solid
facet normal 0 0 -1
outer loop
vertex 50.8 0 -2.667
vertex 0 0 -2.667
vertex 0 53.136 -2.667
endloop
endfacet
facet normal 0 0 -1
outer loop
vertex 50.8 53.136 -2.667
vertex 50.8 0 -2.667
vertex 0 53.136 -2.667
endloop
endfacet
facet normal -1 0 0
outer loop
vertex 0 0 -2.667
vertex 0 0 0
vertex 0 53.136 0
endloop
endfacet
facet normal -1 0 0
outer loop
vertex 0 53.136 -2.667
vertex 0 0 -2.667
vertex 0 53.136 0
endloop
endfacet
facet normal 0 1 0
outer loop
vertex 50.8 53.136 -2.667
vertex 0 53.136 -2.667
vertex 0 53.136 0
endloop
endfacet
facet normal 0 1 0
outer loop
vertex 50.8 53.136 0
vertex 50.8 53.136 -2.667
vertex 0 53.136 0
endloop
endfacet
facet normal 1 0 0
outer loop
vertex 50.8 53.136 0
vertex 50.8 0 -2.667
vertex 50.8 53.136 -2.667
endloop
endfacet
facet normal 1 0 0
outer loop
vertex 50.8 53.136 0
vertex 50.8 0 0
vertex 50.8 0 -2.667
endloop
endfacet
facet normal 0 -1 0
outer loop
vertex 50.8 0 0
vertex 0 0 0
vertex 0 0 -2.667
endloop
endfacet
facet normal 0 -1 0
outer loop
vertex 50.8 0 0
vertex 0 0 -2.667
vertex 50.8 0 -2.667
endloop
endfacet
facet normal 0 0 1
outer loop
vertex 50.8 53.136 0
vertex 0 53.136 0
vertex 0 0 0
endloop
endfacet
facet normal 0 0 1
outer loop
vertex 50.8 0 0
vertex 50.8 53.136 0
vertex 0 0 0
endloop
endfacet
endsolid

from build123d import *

# Parameters (mm, degrees)
SKETCH1_W                    = 50.8
SKETCH1_H                    = 25.4
BASE_FLANGE1_DEPTH           = 2.667
EDGE_FLANGE1_STRIP_W         = 12.1412
EDGE_FLANGE1_STRIP_H         = 2.667
EDGE_FLANGE1_STRIP_CUT_DEPTH = 50.8
EDGE_FLANGE1_DEPTH           = 50.8
UNFOLD1_DEPTH                = 50.8
UNFOLD1_2_DEPTH              = 50.8


# Read off the part's stored shape, not the designer's step: Unfold1
# Sheet-metal steps are written as plain solids
with BuildPart() as part:
    # Sketch1 → Base-Flange1 (new body)
    with BuildSketch(Plane.XY):
        with Locations((25.4, 12.7)):
            Rectangle(SKETCH1_W, SKETCH1_H)
    extrude(amount=-BASE_FLANGE1_DEPTH)

    # Edge-Flange1 strip (across the edge) → Edge-Flange1 strip cut (cut)
    with BuildSketch(Plane(origin=(50.8, 25.4, 0), x_dir=(0, -1, 0), z_dir=(-1, 0, 0))):
        with Locations((-2.667, -1.3335)):
            Rectangle(EDGE_FLANGE1_STRIP_W, EDGE_FLANGE1_STRIP_H)
    extrude(amount=EDGE_FLANGE1_STRIP_CUT_DEPTH, mode=Mode.SUBTRACT)

    # Edge-Flange1 section (across the edge) → Edge-Flange1 (add)
    with BuildSketch(Plane(origin=(50.8, 25.4, 0), x_dir=(0, -1, 0), z_dir=(-1, 0, 0))):
        with BuildLine():
            Line((0, 0.7366), (0, 29.337))
            Line((0, 29.337), (2.667, 29.337))
            Line((2.667, 29.337), (2.667, 0.7366))
            ThreePointArc((2.667, 0.7366), (2.882745145, 0.215745145), (3.4036, 0))
            Line((3.4036, 0), (3.4036, -2.667))
            ThreePointArc((3.4036, -2.667), (0.99689136, -1.67010864), (0, 0.7366))
        make_face()
    extrude(amount=EDGE_FLANGE1_DEPTH)

    # Unfold1 outline → Unfold1 (cut)
    with BuildSketch(Plane.YZ):
        with BuildLine():
            Line((21.9964, 0), (25.319337465, 0))
            ThreePointArc((25.319337465, 0), (25.379774271, 0.366098312), (25.4, 0.7366))
            Line((25.4, 0.7366), (25.4, 29.337))
            Line((25.4, 29.337), (22.733, 29.337))
            Line((22.733, 29.337), (22.733, 0.7366))
            ThreePointArc((22.733, 0.7366), (22.517254855, 0.215745145), (21.9964, 0))
        make_face()
    extrude(amount=UNFOLD1_DEPTH, mode=Mode.SUBTRACT)

    # Unfold1 2 outline → Unfold1 2 (add)
    with BuildSketch(Plane.YZ):
        with BuildLine():
            Line((21.9964, -2.667), (53.136322129, -2.667))
            Line((53.136322129, -2.667), (53.136322129, 0))
            Line((53.136322129, 0), (25.319337465, 0))
            ThreePointArc((25.319337465, 0), (24.126822634, -1.917791146), (21.9964, -2.667))
        make_face()
    extrude(amount=UNFOLD1_2_DEPTH)


solid = part.part
